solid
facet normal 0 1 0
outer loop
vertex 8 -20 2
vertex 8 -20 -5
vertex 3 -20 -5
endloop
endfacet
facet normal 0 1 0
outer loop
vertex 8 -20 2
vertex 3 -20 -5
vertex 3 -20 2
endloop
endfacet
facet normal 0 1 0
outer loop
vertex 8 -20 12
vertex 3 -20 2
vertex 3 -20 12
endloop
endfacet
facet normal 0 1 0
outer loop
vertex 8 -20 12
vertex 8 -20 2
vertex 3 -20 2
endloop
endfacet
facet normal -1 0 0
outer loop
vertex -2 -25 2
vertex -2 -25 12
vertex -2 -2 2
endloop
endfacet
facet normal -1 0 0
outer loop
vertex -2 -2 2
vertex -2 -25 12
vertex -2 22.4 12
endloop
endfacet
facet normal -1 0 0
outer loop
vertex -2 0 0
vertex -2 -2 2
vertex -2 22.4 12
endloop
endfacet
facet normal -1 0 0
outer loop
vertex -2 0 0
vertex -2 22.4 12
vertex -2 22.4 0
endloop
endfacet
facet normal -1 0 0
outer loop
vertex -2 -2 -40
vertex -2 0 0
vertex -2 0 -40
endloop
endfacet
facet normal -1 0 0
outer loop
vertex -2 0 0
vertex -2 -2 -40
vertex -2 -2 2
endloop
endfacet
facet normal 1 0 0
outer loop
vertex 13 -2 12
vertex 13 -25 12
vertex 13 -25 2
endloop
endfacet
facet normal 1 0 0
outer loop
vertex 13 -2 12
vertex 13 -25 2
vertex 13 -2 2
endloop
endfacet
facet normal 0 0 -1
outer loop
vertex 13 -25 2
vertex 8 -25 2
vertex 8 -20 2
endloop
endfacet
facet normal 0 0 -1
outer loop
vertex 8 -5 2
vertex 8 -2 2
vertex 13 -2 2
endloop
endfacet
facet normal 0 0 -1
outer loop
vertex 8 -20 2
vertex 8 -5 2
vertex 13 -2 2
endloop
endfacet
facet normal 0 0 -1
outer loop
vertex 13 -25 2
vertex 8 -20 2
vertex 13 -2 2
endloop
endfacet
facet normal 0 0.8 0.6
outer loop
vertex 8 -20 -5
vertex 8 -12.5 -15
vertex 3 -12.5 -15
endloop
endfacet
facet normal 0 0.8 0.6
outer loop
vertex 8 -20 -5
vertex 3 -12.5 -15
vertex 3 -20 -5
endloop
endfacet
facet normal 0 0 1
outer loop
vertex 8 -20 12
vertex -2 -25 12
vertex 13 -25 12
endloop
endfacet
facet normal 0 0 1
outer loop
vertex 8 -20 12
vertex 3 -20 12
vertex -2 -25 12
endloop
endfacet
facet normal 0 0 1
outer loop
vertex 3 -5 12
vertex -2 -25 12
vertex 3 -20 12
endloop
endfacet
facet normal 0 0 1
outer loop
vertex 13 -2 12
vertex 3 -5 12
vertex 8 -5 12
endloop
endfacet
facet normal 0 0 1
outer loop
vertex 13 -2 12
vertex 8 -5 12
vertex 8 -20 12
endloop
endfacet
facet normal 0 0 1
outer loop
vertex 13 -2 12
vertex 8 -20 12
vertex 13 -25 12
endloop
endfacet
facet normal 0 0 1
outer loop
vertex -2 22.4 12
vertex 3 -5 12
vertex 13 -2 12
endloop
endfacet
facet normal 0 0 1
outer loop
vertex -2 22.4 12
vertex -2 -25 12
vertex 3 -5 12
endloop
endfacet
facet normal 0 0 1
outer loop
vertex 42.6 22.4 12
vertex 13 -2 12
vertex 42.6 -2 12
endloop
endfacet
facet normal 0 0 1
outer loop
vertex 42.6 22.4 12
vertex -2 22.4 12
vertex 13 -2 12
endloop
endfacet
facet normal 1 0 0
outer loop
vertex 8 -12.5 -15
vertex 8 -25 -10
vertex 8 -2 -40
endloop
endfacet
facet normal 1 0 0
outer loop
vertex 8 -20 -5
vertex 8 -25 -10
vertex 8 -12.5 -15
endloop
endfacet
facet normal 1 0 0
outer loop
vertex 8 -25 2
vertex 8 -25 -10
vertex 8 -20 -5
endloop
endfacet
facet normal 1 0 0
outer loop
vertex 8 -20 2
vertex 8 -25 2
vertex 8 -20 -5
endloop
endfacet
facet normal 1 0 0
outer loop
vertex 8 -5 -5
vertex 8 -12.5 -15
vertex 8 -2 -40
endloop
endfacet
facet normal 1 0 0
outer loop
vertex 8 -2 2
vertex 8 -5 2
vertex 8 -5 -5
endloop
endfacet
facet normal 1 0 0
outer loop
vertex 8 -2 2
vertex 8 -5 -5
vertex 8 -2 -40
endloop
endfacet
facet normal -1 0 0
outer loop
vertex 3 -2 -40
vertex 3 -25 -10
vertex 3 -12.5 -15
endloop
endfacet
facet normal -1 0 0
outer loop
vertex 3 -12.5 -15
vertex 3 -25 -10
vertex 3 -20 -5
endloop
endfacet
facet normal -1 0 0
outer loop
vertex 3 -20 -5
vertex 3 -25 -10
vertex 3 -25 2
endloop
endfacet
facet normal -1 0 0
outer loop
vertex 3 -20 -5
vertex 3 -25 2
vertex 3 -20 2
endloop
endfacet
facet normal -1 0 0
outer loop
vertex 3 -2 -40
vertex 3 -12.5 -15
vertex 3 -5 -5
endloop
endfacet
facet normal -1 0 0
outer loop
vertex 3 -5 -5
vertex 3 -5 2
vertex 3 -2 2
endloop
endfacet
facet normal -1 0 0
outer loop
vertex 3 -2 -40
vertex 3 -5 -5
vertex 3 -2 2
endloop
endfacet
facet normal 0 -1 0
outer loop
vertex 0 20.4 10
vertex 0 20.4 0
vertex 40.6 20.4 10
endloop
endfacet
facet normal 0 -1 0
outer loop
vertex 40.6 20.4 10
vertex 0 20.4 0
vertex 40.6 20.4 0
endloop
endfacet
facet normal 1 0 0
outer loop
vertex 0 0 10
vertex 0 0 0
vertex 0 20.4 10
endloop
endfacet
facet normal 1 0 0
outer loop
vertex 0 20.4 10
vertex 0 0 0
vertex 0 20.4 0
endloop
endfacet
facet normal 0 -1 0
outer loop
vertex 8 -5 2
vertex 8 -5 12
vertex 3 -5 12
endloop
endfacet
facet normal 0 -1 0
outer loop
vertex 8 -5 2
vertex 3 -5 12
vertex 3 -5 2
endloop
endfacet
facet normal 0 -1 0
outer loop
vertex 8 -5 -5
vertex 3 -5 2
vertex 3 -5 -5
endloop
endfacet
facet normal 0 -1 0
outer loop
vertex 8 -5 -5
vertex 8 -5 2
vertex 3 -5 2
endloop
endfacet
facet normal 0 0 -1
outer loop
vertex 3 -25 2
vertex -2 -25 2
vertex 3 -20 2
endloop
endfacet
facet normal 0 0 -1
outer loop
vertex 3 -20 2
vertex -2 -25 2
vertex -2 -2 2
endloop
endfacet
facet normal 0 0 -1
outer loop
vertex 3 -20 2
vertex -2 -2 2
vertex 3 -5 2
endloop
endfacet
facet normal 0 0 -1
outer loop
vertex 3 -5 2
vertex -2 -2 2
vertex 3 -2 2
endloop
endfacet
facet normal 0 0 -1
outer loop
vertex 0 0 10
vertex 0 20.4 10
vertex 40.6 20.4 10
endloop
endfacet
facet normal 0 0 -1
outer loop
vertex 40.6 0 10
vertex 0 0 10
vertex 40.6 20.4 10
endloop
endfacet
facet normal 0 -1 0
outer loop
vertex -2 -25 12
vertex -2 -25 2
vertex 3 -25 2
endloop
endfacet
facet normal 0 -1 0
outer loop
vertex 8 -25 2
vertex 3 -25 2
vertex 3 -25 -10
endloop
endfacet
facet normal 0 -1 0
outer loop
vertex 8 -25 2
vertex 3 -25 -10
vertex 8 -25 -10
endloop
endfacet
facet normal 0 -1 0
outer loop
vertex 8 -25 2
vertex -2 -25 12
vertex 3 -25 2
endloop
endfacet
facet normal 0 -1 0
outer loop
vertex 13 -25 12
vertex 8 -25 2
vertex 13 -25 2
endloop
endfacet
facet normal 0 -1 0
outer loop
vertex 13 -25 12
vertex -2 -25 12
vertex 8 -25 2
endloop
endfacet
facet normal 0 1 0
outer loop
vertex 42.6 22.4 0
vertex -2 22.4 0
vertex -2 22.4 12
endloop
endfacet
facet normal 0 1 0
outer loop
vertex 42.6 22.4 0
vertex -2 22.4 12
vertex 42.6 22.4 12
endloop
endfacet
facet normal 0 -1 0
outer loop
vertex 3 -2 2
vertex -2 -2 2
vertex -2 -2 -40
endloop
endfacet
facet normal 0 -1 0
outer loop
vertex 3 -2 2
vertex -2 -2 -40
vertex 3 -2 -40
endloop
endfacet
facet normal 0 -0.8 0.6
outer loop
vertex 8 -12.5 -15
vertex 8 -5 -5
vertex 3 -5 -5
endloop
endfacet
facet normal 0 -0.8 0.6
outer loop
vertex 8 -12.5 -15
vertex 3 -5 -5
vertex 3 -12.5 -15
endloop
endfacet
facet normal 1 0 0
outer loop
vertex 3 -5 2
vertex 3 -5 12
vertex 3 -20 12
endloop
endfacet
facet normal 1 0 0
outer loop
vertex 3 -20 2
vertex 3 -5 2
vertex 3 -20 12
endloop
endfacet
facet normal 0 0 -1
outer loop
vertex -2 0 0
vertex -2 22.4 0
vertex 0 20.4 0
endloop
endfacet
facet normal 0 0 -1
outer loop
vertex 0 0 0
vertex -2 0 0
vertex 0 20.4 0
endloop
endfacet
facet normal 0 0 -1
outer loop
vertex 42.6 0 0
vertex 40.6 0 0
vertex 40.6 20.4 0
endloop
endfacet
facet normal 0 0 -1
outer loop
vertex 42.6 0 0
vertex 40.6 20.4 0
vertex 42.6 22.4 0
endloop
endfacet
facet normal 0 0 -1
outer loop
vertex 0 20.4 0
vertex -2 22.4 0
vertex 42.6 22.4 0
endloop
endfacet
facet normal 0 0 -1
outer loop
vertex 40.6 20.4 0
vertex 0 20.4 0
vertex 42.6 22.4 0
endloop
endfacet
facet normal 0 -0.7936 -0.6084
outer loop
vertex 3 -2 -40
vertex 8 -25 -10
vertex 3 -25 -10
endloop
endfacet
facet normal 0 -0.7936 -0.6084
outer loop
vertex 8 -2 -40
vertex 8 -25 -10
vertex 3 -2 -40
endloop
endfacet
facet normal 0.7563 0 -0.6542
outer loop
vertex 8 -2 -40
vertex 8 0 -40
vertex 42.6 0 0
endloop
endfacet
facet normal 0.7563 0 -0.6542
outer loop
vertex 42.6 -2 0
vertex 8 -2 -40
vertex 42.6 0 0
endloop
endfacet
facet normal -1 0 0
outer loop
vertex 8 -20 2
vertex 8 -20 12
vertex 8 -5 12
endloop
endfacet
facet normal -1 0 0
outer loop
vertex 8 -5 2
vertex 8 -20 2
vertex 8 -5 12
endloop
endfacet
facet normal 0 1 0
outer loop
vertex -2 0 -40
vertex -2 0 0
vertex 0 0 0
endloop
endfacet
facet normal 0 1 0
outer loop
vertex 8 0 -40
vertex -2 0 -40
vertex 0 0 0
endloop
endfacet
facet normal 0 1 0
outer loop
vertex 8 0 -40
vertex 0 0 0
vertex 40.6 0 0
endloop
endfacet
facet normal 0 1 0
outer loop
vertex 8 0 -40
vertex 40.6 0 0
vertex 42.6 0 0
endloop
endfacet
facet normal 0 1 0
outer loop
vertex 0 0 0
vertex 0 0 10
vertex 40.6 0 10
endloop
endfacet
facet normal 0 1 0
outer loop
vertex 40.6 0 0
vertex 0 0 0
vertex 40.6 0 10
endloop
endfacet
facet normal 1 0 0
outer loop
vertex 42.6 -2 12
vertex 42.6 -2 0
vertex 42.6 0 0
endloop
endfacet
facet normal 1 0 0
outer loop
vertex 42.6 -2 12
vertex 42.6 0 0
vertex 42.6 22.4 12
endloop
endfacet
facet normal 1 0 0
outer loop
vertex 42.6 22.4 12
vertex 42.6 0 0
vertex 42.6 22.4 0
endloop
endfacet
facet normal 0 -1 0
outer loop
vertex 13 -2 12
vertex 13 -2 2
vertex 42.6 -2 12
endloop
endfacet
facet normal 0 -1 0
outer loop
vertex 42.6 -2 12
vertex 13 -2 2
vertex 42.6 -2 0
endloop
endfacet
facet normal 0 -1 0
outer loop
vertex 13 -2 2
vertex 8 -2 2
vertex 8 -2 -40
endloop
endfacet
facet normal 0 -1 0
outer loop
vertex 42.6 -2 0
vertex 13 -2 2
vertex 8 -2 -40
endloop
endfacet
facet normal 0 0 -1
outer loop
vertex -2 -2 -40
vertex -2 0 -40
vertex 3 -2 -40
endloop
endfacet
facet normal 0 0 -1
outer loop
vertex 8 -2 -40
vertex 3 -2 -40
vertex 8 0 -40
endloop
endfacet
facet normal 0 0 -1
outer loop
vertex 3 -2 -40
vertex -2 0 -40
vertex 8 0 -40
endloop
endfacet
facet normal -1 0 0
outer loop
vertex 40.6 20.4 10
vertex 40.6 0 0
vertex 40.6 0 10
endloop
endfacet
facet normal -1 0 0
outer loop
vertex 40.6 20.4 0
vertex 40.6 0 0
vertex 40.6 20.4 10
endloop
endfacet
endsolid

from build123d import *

# Parameters (mm, degrees)
SKETCH002_W   = 44.6
SKETCH002_H   = 24.4
SKETCH002_W_2 = 40.6
SKETCH002_H_2 = 20.4
PAD001_DEPTH  = 12
BOX_W         = 44.2
BOX_H         = 24.2
BOX_DEPTH     = 2
PAD_DEPTH     = 2.5
SKETCH003_W   = 15
SKETCH003_H   = 25
PAD002_DEPTH  = 10
PAD003_DEPTH  = 2


with BuildPart() as part:
    # Sketch002 → Pad001 (new body)
    with BuildSketch(Plane.XY):
        with Locations((20.3, 10.2)):
            Rectangle(SKETCH002_W, SKETCH002_H)
        with Locations((20.3, 10.2)):
            Rectangle(SKETCH002_W_2, SKETCH002_H_2, mode=Mode.SUBTRACT)
    extrude(amount=PAD001_DEPTH)

    # Box → Box (join)
    with BuildSketch(Plane(origin=(-2, -2, 10), x_dir=(1, 0, 0), z_dir=(0, 0, 1))):
        with Locations((22.1, 12.1)):
            Rectangle(BOX_W, BOX_H)
    extrude(amount=BOX_DEPTH)

    # Sketch → Pad (join, symmetric)
    with BuildSketch(Plane.YZ.offset(5.5)):
        Polygon((-25, -10), (-2, -40), (0, -40), (0, -10), (0, 12), (-5, 12), (-5, -5), (-12.5, -15), (-20, -5), (-20, 12), (-25, 12), align=None)
    extrude(amount=PAD_DEPTH, both=True)

    # Sketch003 → Pad002 (join)
    with BuildSketch(Plane.XY.offset(12)):
        with Locations((5.5, -12.5)):
            Rectangle(SKETCH003_W, SKETCH003_H)
        with BuildLine():
            Line((3, -5), (3, -20))
            ThreePointArc((3, -20), (5.5, -22.5), (8, -20))
            Line((8, -20), (8, -5))
            ThreePointArc((8, -5), (5.5, -2.5), (3, -5))
        make_face(mode=Mode.SUBTRACT)
    extrude(amount=-PAD002_DEPTH)

    # Sketch004 → Pad003 (join)
    with BuildSketch(Plane.XZ):
        Polygon((-2, 0), (-2, -40), (8, -40), (42.6, 0), align=None)
    extrude(amount=PAD003_DEPTH)


solid = part.part
